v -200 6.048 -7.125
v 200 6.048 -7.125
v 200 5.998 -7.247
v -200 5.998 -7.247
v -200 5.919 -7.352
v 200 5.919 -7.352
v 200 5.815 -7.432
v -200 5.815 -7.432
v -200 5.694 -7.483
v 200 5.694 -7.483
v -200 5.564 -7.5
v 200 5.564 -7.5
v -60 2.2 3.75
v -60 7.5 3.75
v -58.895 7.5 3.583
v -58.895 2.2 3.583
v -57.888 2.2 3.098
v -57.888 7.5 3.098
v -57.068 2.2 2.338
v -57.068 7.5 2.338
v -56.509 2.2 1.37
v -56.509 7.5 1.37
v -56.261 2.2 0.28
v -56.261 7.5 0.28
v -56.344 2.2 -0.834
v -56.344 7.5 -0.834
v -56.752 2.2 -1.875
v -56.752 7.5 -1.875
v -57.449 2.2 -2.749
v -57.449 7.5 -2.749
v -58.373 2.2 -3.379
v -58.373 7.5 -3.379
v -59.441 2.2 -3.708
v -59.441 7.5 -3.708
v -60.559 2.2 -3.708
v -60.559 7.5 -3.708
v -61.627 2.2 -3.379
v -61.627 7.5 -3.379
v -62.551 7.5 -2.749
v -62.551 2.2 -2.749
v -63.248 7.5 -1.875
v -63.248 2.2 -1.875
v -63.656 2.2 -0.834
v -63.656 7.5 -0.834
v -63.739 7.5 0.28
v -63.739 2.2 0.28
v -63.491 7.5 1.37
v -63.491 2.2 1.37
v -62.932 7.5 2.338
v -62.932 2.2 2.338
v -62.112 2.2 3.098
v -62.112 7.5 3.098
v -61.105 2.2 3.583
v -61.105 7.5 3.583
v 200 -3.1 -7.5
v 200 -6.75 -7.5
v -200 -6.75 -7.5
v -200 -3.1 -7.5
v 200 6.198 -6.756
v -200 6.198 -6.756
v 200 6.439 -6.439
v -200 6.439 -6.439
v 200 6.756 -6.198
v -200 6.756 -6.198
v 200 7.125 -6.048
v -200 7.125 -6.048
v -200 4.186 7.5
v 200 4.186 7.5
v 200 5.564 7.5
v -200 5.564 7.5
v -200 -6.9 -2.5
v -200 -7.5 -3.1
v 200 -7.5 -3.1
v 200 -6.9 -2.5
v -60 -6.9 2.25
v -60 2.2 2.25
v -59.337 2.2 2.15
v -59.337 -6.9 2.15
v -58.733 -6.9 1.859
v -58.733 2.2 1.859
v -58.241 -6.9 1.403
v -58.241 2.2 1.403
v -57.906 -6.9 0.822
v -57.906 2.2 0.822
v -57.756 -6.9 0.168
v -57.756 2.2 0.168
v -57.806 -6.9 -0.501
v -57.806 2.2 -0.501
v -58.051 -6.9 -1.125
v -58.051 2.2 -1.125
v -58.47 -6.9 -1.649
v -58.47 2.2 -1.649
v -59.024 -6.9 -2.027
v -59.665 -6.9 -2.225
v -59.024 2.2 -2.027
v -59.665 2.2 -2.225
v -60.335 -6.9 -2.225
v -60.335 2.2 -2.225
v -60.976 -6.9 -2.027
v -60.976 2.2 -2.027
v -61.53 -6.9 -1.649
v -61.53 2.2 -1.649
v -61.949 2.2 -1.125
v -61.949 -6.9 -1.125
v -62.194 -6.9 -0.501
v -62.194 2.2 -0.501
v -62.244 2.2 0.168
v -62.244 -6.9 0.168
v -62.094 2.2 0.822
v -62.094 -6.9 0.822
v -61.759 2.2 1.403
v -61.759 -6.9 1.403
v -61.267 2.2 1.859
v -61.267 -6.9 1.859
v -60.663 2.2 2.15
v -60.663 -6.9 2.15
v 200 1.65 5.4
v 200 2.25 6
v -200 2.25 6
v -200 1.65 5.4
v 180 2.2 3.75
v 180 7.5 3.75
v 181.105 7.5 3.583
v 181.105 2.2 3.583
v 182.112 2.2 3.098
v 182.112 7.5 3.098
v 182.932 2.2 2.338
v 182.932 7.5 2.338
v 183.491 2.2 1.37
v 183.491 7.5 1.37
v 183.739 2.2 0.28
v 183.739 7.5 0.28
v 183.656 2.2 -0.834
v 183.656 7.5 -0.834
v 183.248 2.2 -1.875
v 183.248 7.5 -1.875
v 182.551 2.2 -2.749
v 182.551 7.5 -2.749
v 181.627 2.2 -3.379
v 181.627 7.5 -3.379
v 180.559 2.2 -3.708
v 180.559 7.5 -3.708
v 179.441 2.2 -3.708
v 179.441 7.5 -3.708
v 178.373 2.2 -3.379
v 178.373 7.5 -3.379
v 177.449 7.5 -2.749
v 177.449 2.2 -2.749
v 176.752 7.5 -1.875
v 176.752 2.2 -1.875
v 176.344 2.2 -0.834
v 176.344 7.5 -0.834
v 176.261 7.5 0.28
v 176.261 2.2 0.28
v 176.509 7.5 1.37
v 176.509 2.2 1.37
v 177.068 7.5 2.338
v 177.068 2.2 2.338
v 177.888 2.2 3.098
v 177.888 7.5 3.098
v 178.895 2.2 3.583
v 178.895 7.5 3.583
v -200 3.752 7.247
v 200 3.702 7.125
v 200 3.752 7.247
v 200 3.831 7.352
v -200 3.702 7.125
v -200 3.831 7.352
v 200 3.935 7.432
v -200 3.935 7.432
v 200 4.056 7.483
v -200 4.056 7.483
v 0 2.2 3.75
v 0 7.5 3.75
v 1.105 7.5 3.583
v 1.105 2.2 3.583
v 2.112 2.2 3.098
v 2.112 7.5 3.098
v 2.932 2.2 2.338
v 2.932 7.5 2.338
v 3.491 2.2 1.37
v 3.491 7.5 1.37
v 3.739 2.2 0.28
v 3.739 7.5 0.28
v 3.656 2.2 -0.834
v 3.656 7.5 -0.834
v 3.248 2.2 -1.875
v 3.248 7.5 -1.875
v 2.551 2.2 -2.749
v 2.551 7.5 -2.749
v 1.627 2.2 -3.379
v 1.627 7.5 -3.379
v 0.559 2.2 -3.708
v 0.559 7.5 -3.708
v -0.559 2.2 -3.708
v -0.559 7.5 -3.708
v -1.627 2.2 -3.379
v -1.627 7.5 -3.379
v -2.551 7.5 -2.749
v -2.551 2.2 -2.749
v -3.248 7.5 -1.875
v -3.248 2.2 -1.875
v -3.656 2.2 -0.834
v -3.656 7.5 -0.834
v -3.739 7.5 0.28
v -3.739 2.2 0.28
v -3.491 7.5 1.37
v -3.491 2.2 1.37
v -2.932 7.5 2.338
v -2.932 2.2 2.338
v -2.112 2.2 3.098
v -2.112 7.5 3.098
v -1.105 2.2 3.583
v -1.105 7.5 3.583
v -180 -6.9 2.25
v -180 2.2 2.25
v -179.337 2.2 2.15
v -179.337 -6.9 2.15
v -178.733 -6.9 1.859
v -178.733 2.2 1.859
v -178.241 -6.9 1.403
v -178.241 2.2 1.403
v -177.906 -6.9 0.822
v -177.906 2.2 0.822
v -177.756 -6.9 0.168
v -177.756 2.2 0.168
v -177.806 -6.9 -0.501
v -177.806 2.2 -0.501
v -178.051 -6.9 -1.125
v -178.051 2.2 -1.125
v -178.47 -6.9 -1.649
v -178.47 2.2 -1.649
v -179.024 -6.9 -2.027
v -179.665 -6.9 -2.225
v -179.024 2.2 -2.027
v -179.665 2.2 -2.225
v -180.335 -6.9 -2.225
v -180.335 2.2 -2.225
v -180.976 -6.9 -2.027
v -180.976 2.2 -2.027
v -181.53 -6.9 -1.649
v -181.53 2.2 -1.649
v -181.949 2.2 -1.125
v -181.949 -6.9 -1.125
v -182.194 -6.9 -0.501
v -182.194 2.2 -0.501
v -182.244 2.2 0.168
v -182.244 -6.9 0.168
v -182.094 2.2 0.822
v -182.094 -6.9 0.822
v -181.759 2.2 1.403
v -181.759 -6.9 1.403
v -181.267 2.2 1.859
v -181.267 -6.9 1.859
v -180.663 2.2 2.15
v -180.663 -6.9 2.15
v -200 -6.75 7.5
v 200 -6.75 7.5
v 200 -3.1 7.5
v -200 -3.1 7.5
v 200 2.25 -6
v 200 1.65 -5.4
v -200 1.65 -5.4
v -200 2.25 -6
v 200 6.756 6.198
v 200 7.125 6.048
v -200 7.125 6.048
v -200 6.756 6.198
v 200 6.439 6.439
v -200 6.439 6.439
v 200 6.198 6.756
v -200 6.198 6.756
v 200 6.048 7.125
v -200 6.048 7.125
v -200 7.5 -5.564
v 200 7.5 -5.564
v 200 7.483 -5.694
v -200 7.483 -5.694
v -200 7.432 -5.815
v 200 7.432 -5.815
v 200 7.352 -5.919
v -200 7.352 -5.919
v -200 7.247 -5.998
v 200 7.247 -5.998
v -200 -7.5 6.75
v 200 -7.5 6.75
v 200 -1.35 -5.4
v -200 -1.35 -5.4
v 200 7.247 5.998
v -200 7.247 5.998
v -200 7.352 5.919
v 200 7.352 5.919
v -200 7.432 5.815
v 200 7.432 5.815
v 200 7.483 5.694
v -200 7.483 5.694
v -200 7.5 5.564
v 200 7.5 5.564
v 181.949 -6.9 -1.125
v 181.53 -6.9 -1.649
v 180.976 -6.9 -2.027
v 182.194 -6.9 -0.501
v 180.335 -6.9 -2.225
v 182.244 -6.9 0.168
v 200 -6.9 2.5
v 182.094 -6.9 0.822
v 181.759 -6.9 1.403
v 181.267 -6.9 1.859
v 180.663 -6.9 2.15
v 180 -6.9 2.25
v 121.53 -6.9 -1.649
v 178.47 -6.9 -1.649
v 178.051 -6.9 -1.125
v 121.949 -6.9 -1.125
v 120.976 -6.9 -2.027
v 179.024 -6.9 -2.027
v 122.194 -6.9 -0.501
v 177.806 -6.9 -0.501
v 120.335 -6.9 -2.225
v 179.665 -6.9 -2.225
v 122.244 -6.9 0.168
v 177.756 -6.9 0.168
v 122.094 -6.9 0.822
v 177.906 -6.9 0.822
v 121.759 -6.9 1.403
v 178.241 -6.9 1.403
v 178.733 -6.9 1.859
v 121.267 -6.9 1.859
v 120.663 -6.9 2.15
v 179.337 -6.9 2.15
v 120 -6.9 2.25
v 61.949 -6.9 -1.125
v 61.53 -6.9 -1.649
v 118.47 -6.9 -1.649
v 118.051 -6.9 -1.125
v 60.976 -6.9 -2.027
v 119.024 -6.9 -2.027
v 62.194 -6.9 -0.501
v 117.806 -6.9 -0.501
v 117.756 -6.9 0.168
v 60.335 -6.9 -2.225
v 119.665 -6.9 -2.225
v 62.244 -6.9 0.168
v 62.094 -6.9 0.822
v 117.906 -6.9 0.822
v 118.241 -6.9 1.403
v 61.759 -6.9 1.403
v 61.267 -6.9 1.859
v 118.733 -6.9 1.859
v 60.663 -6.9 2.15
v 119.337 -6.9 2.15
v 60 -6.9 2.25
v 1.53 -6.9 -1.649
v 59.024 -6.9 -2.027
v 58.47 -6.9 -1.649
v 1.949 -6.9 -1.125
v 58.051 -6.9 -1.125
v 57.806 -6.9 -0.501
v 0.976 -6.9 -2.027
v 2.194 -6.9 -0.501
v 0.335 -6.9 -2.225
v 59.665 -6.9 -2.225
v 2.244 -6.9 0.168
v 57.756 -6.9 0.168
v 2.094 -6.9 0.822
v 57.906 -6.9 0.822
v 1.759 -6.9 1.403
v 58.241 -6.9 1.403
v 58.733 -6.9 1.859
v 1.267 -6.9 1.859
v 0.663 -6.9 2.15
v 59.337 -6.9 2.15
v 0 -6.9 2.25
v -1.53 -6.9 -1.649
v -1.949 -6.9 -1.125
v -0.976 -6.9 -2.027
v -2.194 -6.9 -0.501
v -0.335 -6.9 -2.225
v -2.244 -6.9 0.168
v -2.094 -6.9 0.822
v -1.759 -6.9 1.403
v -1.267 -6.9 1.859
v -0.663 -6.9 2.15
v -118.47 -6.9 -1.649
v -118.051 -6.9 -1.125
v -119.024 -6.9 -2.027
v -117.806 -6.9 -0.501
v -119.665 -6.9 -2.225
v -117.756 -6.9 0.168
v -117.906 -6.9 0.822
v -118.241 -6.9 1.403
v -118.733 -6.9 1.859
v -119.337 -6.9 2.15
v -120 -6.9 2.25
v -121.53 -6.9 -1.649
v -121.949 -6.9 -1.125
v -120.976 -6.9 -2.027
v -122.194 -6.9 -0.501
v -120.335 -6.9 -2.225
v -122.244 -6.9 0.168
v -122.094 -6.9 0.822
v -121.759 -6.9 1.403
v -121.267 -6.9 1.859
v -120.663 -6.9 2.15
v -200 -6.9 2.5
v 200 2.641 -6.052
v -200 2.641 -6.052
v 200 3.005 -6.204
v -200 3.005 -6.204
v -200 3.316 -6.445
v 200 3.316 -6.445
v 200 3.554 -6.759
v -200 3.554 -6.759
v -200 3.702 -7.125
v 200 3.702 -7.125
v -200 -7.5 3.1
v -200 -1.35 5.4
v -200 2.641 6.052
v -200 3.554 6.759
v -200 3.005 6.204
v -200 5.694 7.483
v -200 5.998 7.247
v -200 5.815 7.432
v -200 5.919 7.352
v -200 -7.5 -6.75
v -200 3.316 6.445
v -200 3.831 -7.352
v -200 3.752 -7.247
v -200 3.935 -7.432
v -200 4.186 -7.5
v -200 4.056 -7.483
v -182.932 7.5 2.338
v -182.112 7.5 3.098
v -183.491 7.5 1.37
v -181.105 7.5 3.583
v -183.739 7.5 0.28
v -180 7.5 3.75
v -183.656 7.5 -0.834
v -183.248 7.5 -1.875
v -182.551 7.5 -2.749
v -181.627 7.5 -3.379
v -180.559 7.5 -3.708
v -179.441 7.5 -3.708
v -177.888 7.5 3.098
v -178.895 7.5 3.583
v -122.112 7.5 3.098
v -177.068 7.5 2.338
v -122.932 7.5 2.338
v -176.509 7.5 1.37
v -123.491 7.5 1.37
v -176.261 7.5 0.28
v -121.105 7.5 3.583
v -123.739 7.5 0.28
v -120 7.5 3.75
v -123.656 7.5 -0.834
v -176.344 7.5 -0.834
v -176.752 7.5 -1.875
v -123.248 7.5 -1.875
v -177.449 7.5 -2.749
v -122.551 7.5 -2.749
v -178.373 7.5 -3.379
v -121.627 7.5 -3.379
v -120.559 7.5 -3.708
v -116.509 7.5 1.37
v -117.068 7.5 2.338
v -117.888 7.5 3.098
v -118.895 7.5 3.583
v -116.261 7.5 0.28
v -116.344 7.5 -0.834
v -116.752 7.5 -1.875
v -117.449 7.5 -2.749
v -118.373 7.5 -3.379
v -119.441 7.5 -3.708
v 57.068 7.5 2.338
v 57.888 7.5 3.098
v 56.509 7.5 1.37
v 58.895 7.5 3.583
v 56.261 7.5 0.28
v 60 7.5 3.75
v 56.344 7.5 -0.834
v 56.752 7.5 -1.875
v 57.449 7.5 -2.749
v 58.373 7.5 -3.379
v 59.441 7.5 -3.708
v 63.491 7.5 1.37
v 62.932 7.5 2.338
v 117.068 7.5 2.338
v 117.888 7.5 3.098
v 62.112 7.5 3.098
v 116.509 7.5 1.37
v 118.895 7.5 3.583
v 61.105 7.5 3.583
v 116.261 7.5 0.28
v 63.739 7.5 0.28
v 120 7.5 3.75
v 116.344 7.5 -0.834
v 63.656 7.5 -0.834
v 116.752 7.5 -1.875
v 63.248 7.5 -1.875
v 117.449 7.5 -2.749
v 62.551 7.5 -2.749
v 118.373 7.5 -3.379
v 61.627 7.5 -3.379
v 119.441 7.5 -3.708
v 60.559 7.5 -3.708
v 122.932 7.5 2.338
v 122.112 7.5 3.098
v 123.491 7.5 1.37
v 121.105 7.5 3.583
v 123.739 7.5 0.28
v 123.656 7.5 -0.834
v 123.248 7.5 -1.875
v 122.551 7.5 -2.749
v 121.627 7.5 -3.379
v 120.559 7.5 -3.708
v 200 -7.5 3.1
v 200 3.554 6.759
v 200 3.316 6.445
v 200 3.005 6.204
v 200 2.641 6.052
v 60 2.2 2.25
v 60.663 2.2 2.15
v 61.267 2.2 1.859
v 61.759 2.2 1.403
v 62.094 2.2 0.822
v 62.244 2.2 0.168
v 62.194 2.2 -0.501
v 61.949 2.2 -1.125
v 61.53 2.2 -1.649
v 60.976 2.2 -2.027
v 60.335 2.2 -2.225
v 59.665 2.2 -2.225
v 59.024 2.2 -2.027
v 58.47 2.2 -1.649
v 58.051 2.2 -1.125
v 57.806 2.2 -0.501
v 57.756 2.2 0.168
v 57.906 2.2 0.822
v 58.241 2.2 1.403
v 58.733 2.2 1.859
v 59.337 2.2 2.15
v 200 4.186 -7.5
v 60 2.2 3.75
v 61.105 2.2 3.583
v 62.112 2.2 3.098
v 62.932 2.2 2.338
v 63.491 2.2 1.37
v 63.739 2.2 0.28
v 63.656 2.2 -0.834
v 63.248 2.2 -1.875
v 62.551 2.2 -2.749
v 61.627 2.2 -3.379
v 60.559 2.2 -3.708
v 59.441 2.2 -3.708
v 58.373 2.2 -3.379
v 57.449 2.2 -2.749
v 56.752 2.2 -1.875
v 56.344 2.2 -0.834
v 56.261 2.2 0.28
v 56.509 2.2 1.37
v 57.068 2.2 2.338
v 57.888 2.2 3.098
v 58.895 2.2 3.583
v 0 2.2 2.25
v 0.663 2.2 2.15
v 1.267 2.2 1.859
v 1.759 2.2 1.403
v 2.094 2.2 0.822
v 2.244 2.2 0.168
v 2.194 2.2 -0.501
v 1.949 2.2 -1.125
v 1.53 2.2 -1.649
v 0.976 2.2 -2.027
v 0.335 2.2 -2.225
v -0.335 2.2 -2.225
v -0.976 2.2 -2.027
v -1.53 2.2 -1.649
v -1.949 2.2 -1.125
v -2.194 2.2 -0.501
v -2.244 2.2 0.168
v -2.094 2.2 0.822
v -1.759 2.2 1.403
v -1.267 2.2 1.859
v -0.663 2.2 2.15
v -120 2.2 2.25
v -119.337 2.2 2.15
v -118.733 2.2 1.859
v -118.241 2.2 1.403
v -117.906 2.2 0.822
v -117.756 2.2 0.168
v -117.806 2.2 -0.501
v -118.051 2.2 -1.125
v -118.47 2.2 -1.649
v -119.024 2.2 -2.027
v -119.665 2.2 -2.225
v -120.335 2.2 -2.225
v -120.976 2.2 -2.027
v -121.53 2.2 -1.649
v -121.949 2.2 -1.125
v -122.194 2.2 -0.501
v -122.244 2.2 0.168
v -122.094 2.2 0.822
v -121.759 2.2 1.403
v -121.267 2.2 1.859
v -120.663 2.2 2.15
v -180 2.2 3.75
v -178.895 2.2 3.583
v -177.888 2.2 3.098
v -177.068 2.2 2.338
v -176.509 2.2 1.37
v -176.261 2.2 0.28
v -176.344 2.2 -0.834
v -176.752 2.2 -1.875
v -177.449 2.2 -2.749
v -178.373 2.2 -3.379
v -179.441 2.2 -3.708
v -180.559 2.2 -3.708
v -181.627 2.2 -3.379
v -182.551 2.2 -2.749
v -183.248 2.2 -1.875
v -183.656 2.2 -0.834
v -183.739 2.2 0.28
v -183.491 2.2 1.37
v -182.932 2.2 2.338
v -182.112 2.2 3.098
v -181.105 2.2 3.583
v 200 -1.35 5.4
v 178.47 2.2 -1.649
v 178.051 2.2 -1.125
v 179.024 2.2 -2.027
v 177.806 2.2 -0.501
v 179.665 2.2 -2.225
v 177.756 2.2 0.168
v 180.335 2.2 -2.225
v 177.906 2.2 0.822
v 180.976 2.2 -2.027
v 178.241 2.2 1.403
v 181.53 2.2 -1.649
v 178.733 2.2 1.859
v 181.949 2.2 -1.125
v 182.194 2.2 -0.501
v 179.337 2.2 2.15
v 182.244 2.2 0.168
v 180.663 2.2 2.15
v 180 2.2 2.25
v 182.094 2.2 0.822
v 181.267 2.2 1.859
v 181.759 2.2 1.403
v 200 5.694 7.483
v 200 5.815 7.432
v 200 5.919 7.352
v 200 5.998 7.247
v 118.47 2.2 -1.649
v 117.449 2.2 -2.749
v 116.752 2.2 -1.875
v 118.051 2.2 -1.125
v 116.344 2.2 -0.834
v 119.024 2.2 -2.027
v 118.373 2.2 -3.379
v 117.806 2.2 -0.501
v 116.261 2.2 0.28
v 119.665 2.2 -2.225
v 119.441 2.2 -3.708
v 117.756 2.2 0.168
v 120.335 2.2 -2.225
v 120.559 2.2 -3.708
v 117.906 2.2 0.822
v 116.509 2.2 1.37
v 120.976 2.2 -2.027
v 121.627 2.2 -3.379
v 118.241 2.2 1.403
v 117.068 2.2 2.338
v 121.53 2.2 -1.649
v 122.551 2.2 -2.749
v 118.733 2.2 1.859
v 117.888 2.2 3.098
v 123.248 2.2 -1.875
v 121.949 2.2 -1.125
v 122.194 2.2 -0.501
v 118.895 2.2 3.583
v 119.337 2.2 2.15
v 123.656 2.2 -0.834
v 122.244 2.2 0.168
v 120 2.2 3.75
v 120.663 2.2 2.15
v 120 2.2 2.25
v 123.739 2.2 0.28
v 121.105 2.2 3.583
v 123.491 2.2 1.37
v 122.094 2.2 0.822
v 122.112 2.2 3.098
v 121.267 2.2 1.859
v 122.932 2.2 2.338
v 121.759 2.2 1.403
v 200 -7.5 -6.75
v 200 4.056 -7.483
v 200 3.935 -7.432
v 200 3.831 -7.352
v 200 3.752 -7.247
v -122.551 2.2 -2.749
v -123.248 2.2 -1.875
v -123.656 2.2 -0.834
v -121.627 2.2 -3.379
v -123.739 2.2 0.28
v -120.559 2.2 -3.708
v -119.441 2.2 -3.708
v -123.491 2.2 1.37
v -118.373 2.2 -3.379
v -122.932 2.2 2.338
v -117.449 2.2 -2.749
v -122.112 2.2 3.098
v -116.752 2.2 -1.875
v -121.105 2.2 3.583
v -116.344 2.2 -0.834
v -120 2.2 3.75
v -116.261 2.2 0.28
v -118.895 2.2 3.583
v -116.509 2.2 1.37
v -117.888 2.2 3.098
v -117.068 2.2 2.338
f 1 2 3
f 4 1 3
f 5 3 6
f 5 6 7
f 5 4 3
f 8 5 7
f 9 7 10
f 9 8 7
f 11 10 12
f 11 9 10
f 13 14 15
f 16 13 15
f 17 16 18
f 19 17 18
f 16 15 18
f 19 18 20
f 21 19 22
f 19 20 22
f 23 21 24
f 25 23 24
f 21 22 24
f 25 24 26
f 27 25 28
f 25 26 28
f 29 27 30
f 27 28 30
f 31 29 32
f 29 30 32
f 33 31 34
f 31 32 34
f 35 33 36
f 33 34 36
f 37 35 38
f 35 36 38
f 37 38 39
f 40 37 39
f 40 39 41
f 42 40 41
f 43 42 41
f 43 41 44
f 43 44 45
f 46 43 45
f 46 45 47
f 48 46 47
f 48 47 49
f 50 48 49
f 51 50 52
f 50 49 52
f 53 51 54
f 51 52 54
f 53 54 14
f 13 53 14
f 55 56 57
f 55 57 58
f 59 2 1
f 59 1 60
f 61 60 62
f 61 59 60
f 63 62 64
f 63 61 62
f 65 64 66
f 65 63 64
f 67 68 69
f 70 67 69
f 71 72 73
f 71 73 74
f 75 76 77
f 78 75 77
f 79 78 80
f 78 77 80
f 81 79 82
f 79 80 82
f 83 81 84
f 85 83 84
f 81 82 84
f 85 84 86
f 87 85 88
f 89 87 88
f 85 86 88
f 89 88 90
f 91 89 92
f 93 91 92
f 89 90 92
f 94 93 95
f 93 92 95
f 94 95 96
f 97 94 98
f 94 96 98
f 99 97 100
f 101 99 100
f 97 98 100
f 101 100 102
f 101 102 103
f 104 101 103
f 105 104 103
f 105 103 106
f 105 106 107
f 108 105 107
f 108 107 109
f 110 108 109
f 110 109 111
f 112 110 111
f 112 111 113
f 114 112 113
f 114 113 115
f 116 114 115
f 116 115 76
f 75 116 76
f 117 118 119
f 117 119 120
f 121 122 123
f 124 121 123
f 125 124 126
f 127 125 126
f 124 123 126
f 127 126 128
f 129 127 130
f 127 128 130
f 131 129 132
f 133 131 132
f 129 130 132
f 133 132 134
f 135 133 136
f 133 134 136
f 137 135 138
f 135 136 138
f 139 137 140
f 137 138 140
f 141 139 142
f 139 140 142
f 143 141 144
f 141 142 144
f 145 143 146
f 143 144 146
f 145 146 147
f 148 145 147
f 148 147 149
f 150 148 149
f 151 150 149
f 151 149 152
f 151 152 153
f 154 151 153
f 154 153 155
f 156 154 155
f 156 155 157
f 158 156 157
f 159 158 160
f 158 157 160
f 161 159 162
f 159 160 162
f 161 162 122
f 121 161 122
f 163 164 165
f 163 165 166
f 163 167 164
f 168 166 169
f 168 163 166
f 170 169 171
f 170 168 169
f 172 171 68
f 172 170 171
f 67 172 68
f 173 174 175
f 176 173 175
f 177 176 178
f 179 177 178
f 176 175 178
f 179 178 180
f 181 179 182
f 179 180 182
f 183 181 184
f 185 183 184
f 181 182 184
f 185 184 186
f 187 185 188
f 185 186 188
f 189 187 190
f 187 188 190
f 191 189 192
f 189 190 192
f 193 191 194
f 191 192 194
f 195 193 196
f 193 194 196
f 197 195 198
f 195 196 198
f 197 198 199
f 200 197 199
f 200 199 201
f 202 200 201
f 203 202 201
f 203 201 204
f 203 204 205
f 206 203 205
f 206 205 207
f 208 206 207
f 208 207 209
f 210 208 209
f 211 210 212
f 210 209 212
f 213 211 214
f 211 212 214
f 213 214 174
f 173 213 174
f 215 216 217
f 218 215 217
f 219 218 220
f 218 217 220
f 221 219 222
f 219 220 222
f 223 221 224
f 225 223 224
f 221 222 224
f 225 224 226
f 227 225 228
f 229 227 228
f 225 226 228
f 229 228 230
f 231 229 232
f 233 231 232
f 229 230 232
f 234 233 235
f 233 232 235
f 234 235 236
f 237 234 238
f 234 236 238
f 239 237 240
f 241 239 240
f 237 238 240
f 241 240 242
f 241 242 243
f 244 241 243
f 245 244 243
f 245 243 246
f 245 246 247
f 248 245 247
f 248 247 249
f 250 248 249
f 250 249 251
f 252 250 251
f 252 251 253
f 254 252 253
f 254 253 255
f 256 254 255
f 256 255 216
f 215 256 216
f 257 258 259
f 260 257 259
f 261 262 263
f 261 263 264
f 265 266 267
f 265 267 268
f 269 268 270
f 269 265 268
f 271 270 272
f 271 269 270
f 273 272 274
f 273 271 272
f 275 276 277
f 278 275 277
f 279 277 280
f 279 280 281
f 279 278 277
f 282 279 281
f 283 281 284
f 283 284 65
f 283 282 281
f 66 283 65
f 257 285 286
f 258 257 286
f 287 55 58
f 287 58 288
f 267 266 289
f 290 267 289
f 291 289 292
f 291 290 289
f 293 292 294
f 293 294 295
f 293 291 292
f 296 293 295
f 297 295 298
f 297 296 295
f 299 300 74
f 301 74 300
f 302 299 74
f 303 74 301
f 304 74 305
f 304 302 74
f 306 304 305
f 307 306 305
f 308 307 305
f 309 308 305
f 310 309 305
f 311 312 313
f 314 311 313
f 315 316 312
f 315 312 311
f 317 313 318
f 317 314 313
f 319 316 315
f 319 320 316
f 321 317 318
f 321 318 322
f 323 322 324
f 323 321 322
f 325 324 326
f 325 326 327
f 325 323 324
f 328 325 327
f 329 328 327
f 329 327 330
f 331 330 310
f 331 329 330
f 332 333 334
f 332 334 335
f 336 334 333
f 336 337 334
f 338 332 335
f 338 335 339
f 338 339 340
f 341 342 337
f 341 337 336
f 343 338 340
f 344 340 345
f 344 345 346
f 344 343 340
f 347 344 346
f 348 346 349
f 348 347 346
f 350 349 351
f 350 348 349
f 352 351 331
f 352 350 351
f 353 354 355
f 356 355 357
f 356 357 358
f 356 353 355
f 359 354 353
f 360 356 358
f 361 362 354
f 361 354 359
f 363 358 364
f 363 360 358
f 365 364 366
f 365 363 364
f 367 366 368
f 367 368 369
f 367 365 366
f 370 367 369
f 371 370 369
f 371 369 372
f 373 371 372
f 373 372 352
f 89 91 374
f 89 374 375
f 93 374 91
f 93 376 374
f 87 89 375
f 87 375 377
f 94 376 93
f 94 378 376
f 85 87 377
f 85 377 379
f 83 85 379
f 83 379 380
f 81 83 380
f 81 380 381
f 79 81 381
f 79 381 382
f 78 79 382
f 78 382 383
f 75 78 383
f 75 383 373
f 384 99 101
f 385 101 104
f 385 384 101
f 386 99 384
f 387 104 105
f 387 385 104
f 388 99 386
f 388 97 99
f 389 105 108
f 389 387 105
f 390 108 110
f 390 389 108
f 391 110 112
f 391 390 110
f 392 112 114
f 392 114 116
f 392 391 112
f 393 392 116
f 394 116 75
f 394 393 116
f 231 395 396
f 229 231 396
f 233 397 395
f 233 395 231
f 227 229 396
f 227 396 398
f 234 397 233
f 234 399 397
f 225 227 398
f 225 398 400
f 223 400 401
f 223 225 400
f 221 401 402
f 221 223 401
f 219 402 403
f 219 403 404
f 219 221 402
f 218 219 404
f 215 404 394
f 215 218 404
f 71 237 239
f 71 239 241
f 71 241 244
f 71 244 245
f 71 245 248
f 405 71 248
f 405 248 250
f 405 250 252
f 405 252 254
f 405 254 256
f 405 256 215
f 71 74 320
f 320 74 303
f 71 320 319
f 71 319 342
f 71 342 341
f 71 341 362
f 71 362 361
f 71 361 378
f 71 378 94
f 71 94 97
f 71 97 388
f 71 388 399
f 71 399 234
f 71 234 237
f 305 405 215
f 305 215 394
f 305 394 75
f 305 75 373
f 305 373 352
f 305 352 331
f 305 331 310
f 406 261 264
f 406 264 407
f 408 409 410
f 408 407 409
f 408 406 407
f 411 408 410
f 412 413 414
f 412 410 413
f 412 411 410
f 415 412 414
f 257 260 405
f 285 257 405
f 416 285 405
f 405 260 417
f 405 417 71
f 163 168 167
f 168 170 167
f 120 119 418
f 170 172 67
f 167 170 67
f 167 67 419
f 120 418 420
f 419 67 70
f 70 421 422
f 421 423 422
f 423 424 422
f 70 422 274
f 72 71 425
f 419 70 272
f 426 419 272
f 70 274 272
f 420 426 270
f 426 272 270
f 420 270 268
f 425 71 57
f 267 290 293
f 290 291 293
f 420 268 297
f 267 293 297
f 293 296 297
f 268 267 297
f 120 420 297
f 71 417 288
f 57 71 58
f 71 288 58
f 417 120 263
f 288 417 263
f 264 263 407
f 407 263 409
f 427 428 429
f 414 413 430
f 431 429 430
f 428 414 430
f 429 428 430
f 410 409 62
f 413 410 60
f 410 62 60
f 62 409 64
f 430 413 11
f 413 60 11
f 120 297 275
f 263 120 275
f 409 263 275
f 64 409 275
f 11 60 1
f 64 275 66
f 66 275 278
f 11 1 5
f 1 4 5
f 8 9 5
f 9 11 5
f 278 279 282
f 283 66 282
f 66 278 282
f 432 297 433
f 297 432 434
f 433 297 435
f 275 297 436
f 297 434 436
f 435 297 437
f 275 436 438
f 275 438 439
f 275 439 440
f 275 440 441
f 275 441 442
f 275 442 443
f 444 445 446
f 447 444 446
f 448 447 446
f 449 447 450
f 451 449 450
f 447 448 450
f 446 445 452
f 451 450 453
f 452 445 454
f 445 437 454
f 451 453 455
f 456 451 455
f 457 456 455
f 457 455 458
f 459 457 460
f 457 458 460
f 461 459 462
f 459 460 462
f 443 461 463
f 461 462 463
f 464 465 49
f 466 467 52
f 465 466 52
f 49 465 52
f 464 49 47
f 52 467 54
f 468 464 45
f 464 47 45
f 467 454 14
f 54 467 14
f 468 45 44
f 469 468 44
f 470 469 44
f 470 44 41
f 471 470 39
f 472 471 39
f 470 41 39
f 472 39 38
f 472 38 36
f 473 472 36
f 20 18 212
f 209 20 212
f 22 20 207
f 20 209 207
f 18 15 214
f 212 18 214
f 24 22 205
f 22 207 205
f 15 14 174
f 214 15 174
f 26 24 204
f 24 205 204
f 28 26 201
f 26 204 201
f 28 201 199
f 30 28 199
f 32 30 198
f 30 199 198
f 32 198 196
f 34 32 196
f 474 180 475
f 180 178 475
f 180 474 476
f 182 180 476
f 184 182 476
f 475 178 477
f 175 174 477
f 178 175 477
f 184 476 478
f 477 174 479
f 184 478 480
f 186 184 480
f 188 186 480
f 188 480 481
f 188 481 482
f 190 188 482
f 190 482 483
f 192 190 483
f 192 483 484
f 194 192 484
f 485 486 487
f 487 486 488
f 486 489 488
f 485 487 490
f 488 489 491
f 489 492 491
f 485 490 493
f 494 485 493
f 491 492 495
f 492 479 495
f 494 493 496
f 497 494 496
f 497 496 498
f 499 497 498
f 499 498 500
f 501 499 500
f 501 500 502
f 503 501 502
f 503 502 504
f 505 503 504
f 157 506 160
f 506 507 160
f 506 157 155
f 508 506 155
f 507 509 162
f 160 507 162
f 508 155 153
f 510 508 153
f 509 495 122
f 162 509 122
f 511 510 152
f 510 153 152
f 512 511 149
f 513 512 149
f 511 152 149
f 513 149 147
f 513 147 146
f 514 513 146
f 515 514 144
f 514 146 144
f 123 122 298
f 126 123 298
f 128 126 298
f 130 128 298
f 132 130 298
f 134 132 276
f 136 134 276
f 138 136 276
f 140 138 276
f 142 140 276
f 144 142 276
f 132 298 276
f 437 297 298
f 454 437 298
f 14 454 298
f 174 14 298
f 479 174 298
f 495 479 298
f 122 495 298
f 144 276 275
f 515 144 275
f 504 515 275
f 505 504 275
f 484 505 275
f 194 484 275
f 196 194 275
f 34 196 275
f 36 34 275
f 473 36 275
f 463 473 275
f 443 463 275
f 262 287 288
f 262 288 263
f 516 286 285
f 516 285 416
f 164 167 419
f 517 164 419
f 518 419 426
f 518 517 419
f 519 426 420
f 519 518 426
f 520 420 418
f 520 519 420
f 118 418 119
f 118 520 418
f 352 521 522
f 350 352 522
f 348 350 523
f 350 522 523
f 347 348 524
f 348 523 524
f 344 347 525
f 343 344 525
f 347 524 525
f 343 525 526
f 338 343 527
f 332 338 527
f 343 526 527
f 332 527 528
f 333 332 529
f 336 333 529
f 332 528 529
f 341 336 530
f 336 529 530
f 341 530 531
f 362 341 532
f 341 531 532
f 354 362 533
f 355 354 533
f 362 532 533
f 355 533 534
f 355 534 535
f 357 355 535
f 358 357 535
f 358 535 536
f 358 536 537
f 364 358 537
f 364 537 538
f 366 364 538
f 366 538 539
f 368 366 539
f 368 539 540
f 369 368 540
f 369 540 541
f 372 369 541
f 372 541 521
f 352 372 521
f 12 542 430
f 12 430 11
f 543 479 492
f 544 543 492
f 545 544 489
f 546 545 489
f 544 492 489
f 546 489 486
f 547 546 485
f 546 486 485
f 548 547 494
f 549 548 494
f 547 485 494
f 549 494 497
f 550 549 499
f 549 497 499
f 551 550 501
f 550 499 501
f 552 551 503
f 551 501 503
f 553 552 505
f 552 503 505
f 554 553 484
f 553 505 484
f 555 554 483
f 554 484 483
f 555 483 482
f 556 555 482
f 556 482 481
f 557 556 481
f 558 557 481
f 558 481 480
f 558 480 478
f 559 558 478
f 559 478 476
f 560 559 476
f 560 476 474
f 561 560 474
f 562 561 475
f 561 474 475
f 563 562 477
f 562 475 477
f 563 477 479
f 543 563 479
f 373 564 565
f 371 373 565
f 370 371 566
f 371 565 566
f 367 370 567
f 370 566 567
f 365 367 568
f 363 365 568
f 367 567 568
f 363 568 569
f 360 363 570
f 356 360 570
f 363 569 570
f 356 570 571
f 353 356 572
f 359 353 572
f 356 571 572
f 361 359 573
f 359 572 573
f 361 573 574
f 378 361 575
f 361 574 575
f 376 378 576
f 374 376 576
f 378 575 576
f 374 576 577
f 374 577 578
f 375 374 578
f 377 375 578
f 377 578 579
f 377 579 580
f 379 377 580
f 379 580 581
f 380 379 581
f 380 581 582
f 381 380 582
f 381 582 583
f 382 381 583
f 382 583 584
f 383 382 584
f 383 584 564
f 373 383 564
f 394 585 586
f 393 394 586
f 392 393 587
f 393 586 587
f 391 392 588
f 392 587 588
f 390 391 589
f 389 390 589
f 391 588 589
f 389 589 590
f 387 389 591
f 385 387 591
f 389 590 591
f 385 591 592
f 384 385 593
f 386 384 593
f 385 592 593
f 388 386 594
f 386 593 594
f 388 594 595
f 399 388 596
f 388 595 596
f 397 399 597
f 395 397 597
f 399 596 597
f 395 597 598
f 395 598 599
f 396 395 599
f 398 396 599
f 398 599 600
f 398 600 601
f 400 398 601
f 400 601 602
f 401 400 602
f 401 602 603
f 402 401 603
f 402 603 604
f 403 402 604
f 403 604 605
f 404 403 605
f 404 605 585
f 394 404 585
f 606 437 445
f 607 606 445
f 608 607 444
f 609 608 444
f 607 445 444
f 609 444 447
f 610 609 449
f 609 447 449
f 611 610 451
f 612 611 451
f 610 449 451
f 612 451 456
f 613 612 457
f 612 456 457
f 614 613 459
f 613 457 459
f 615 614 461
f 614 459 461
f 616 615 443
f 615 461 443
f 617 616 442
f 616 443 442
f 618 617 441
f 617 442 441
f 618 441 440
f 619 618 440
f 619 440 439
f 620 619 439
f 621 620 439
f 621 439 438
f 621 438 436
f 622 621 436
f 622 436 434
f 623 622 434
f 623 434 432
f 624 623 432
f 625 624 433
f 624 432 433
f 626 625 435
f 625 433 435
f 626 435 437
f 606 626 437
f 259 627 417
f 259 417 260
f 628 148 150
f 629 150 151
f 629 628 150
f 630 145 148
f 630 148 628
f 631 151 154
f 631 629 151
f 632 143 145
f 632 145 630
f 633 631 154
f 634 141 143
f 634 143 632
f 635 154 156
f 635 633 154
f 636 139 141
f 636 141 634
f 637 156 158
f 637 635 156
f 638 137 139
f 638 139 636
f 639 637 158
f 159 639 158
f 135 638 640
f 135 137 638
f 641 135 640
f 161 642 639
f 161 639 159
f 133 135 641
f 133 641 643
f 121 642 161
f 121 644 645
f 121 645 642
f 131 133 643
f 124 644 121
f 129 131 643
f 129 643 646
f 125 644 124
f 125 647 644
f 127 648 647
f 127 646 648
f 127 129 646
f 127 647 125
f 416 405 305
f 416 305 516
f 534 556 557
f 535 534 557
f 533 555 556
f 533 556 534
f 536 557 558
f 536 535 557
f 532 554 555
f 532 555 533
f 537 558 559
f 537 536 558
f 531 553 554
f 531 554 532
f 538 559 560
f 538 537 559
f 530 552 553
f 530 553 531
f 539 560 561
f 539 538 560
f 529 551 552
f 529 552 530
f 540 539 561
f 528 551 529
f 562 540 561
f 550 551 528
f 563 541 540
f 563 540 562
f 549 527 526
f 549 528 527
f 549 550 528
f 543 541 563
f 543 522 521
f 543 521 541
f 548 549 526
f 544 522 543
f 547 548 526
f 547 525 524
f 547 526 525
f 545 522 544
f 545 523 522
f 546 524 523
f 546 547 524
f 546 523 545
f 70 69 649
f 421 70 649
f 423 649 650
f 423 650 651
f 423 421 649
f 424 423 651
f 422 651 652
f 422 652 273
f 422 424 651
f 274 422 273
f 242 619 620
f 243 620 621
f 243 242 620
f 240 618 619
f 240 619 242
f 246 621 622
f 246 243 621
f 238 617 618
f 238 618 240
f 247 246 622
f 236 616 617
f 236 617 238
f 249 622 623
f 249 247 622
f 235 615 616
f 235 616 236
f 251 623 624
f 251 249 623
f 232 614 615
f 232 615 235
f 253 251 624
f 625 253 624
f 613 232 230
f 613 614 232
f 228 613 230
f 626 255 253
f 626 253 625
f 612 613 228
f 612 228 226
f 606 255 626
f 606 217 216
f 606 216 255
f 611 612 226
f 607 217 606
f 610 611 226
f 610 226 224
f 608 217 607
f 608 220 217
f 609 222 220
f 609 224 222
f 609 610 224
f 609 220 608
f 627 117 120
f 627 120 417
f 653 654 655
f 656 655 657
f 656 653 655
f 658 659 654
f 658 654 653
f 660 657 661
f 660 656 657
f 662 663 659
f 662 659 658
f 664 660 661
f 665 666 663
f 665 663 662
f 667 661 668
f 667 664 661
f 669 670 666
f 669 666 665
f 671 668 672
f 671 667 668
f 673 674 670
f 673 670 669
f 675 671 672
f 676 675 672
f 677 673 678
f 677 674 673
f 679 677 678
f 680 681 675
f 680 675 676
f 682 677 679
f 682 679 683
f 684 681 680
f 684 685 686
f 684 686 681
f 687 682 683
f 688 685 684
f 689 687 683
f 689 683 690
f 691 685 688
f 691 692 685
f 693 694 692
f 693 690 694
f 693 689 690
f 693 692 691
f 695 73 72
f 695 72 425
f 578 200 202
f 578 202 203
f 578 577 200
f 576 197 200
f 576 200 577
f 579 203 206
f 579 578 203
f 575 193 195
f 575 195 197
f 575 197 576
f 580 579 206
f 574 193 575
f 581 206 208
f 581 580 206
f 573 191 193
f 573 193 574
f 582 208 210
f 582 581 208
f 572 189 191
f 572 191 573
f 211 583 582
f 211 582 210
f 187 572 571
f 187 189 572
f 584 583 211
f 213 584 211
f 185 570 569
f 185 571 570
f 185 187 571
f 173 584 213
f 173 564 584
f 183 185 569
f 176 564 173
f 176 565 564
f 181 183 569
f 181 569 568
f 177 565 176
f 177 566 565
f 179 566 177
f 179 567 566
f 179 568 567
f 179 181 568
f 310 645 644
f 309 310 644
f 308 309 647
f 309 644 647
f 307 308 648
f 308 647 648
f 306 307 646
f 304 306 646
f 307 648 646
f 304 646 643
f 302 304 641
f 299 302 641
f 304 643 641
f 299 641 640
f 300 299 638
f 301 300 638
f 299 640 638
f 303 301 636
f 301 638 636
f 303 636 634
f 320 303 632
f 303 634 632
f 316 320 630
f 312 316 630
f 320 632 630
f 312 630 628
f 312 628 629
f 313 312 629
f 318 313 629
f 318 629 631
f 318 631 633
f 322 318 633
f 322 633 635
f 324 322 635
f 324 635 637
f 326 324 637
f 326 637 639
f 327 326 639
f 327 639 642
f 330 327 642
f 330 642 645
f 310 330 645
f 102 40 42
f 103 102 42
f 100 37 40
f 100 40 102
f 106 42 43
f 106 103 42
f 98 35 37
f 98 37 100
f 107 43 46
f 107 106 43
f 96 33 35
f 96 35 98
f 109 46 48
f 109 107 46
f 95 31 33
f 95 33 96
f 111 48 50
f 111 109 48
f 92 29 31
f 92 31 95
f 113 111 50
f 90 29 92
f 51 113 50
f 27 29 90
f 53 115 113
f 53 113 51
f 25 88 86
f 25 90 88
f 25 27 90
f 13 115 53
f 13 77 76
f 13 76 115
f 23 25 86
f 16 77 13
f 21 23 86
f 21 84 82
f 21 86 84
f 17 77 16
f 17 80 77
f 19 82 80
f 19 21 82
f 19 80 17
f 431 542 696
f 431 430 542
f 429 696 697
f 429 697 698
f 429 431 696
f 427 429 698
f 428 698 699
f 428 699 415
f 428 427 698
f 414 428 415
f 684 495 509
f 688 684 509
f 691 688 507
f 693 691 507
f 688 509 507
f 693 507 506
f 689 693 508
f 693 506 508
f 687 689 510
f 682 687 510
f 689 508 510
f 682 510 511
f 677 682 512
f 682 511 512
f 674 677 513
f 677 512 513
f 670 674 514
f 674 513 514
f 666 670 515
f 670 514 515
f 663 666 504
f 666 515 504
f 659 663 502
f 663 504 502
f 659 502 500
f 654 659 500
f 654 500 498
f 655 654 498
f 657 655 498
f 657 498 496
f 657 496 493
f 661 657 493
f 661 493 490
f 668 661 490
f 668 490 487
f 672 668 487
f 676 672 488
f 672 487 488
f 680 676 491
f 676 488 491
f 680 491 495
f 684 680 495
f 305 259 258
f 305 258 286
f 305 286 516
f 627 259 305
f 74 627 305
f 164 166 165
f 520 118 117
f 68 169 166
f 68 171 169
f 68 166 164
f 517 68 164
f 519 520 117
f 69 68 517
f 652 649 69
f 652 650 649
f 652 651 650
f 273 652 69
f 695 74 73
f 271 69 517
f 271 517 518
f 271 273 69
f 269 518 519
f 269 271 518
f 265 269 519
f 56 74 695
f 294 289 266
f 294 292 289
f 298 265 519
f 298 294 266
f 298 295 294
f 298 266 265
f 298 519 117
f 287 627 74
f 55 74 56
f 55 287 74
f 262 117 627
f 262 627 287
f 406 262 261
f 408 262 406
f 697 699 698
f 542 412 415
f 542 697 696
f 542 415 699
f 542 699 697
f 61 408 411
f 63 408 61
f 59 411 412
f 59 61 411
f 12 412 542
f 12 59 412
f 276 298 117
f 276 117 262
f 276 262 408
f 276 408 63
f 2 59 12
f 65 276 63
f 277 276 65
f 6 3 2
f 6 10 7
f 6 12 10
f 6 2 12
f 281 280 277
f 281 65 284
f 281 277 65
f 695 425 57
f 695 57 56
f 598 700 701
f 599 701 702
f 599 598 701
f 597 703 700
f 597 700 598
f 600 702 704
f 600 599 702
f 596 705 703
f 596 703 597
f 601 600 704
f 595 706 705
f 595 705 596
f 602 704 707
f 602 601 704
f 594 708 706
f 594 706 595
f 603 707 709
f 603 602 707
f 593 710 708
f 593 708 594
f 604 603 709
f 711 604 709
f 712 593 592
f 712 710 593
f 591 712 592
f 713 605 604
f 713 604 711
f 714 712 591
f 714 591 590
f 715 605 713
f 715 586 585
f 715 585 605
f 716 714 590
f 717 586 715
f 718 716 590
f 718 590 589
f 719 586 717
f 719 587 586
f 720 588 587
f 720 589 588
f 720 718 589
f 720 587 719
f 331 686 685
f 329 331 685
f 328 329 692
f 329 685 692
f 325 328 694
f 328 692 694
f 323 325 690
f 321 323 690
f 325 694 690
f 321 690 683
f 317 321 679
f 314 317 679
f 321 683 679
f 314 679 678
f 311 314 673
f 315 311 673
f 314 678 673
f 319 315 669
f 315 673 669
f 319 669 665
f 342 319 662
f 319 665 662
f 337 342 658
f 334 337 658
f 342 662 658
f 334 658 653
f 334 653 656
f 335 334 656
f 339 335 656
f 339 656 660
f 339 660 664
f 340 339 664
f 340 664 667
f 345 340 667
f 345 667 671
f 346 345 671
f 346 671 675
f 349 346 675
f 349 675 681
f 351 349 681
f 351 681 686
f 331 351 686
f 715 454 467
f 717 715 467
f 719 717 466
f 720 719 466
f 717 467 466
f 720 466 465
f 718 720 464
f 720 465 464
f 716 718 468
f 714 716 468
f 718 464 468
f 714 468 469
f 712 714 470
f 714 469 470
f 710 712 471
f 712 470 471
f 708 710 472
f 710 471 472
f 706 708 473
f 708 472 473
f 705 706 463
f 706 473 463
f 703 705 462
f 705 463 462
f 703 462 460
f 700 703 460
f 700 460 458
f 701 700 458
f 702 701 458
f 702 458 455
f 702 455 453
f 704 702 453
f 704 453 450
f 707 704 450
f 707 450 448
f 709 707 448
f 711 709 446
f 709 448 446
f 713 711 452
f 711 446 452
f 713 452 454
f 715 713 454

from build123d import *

# Parameters (mm, degrees)
SKETCH_1_W             = 15
SKETCH_1_H             = 15
EXTRUDE_1_DEPTH        = 200
CHAMFER_1_SIZE         = 0.75
SKETCH_3_R             = 3.74995
CUT_EXTRUDE_2_DEPTH    = 5.3
SKETCH_4_R             = 2.25
CUT_EXTRUDE_3_DEPTH    = 201.375497504
PATTERN_LINEAR_1_COUNT = 7
PATTERN_LINEAR_1_PITCH = 60
CUT_EXTRUDE_4_DEPTH    = 401.140600289
CUT_EXTRUDE_5_DEPTH    = 401.140600289
FILLET_1_R             = 0.5
CUT_EXTRUDE_6_DEPTH    = 401.140600289


with BuildPart() as part:
    # 草图1 → 凸台-拉伸1 (new, symmetric)
    with BuildSketch(Plane(origin=(0, 0, 0), x_dir=(0, 0, -1), z_dir=(1, 0, 0))):
        Rectangle(SKETCH_1_W, SKETCH_1_H)
    extrude(amount=EXTRUDE_1_DEPTH, both=True)

    # 倒角1
    chamfer_1_edges = [part.edges().sort_by_distance(p)[0] for p in [
        (0, -7.5, -7.5),
        (0, -7.5, 7.5),
    ]]
    chamfer(chamfer_1_edges, length=CHAMFER_1_SIZE)

    # 草图3 → 切除-拉伸2 (cut)
    with BuildSketch(Plane(origin=(0, 7.5, 0), x_dir=(1, 0, 0), z_dir=(0, 1, 0))):
        with Locations(Location((-180, 0, 0), (0, 0, 270))):
            Circle(SKETCH_3_R)
    cut_extrude_2 = extrude(amount=-CUT_EXTRUDE_2_DEPTH, mode=Mode.SUBTRACT)

    # 草图4 → 切除-拉伸3 (cut, through all)
    with BuildSketch(Plane(origin=(0, 2.2, 0), x_dir=(1, 0, 0), z_dir=(0, 1, 0))):
        with Locations(Location((-180, 0, 0), (0, 0, 270))):
            Circle(SKETCH_4_R)
    cut_extrude_3 = extrude(amount=-CUT_EXTRUDE_3_DEPTH, mode=Mode.SUBTRACT)

    # 阵列(线性)1: 切除-拉伸2, 切除-拉伸3 ×7
    with Locations(*[(i * PATTERN_LINEAR_1_PITCH, 0, 0) for i in range(1, PATTERN_LINEAR_1_COUNT)]):
        add(cut_extrude_2, mode=Mode.SUBTRACT)
        add(cut_extrude_3, mode=Mode.SUBTRACT)

    # 草图2 → 切除-拉伸4 (cut, through all)
    with BuildSketch(Plane(origin=(200, 0, 0), x_dir=(0, 0, -1), z_dir=(1, 0, 0))):
        with BuildLine():
            Line((-7.5, 7.5), (-6, 7.5))
            ThreePointArc((-6, 7.5), (-6.439339828, 6.439339828), (-7.5, 6))
            Line((-7.5, 6), (-7.5, 7.5))
        make_face()
        with BuildLine():
            Line((7.5, 7.5), (7.5, 6))
            ThreePointArc((7.5, 6), (6.439339828, 6.439339828), (6, 7.5))
            Line((6, 7.5), (7.5, 7.5))
        make_face()
    extrude(amount=-CUT_EXTRUDE_4_DEPTH, mode=Mode.SUBTRACT)

    # 草图5 → 切除-拉伸5 (cut, through all)
    with BuildSketch(Plane(origin=(200, 0, 0), x_dir=(0, 0, -1), z_dir=(1, 0, 0))):
        with BuildLine():
            Line((-6, 2.25), (-5.4, 1.65))
            Line((-5.4, 1.65), (-5.4, -1.35))
            Line((-5.4, -1.35), (-7.5, -3.1))
            Line((-7.5, -3.1), (-7.5, 3.75))
            ThreePointArc((-7.5, 3.75), (-6.439339828, 3.310660172), (-6, 2.25))
        make_face()
        with BuildLine():
            Line((7.5, 3.75), (7.5, -3.1))
            Line((7.5, -3.1), (5.4, -1.35))
            Line((5.4, -1.35), (5.4, 1.65))
            Line((5.4, 1.65), (6, 2.25))
            ThreePointArc((6, 2.25), (6.439339828, 3.310660172), (7.5, 3.75))
        make_face()
    extrude(amount=-CUT_EXTRUDE_5_DEPTH, mode=Mode.SUBTRACT)

    # 圆角1
    fillet_1_edges = [part.edges().sort_by_distance(p)[0] for p in [
        (0, 3.75, -7.5),
        (0, 6, 7.5),
        (0, 7.5, 6),
        (0, 7.5, -6),
        (0, 6, -7.5),
        (0, 3.75, 7.5),
    ]]
    fillet(fillet_1_edges, radius=FILLET_1_R)

    # 草图6 → 切除-拉伸6 (cut, through all)
    with BuildSketch(Plane.ZY.offset(200)):
        Polygon((-3.1, -7.5), (-2.5, -6.9), (2.5, -6.9), (3.1, -7.5), align=None)
    extrude(amount=-CUT_EXTRUDE_6_DEPTH, mode=Mode.SUBTRACT)


solid = part.part
